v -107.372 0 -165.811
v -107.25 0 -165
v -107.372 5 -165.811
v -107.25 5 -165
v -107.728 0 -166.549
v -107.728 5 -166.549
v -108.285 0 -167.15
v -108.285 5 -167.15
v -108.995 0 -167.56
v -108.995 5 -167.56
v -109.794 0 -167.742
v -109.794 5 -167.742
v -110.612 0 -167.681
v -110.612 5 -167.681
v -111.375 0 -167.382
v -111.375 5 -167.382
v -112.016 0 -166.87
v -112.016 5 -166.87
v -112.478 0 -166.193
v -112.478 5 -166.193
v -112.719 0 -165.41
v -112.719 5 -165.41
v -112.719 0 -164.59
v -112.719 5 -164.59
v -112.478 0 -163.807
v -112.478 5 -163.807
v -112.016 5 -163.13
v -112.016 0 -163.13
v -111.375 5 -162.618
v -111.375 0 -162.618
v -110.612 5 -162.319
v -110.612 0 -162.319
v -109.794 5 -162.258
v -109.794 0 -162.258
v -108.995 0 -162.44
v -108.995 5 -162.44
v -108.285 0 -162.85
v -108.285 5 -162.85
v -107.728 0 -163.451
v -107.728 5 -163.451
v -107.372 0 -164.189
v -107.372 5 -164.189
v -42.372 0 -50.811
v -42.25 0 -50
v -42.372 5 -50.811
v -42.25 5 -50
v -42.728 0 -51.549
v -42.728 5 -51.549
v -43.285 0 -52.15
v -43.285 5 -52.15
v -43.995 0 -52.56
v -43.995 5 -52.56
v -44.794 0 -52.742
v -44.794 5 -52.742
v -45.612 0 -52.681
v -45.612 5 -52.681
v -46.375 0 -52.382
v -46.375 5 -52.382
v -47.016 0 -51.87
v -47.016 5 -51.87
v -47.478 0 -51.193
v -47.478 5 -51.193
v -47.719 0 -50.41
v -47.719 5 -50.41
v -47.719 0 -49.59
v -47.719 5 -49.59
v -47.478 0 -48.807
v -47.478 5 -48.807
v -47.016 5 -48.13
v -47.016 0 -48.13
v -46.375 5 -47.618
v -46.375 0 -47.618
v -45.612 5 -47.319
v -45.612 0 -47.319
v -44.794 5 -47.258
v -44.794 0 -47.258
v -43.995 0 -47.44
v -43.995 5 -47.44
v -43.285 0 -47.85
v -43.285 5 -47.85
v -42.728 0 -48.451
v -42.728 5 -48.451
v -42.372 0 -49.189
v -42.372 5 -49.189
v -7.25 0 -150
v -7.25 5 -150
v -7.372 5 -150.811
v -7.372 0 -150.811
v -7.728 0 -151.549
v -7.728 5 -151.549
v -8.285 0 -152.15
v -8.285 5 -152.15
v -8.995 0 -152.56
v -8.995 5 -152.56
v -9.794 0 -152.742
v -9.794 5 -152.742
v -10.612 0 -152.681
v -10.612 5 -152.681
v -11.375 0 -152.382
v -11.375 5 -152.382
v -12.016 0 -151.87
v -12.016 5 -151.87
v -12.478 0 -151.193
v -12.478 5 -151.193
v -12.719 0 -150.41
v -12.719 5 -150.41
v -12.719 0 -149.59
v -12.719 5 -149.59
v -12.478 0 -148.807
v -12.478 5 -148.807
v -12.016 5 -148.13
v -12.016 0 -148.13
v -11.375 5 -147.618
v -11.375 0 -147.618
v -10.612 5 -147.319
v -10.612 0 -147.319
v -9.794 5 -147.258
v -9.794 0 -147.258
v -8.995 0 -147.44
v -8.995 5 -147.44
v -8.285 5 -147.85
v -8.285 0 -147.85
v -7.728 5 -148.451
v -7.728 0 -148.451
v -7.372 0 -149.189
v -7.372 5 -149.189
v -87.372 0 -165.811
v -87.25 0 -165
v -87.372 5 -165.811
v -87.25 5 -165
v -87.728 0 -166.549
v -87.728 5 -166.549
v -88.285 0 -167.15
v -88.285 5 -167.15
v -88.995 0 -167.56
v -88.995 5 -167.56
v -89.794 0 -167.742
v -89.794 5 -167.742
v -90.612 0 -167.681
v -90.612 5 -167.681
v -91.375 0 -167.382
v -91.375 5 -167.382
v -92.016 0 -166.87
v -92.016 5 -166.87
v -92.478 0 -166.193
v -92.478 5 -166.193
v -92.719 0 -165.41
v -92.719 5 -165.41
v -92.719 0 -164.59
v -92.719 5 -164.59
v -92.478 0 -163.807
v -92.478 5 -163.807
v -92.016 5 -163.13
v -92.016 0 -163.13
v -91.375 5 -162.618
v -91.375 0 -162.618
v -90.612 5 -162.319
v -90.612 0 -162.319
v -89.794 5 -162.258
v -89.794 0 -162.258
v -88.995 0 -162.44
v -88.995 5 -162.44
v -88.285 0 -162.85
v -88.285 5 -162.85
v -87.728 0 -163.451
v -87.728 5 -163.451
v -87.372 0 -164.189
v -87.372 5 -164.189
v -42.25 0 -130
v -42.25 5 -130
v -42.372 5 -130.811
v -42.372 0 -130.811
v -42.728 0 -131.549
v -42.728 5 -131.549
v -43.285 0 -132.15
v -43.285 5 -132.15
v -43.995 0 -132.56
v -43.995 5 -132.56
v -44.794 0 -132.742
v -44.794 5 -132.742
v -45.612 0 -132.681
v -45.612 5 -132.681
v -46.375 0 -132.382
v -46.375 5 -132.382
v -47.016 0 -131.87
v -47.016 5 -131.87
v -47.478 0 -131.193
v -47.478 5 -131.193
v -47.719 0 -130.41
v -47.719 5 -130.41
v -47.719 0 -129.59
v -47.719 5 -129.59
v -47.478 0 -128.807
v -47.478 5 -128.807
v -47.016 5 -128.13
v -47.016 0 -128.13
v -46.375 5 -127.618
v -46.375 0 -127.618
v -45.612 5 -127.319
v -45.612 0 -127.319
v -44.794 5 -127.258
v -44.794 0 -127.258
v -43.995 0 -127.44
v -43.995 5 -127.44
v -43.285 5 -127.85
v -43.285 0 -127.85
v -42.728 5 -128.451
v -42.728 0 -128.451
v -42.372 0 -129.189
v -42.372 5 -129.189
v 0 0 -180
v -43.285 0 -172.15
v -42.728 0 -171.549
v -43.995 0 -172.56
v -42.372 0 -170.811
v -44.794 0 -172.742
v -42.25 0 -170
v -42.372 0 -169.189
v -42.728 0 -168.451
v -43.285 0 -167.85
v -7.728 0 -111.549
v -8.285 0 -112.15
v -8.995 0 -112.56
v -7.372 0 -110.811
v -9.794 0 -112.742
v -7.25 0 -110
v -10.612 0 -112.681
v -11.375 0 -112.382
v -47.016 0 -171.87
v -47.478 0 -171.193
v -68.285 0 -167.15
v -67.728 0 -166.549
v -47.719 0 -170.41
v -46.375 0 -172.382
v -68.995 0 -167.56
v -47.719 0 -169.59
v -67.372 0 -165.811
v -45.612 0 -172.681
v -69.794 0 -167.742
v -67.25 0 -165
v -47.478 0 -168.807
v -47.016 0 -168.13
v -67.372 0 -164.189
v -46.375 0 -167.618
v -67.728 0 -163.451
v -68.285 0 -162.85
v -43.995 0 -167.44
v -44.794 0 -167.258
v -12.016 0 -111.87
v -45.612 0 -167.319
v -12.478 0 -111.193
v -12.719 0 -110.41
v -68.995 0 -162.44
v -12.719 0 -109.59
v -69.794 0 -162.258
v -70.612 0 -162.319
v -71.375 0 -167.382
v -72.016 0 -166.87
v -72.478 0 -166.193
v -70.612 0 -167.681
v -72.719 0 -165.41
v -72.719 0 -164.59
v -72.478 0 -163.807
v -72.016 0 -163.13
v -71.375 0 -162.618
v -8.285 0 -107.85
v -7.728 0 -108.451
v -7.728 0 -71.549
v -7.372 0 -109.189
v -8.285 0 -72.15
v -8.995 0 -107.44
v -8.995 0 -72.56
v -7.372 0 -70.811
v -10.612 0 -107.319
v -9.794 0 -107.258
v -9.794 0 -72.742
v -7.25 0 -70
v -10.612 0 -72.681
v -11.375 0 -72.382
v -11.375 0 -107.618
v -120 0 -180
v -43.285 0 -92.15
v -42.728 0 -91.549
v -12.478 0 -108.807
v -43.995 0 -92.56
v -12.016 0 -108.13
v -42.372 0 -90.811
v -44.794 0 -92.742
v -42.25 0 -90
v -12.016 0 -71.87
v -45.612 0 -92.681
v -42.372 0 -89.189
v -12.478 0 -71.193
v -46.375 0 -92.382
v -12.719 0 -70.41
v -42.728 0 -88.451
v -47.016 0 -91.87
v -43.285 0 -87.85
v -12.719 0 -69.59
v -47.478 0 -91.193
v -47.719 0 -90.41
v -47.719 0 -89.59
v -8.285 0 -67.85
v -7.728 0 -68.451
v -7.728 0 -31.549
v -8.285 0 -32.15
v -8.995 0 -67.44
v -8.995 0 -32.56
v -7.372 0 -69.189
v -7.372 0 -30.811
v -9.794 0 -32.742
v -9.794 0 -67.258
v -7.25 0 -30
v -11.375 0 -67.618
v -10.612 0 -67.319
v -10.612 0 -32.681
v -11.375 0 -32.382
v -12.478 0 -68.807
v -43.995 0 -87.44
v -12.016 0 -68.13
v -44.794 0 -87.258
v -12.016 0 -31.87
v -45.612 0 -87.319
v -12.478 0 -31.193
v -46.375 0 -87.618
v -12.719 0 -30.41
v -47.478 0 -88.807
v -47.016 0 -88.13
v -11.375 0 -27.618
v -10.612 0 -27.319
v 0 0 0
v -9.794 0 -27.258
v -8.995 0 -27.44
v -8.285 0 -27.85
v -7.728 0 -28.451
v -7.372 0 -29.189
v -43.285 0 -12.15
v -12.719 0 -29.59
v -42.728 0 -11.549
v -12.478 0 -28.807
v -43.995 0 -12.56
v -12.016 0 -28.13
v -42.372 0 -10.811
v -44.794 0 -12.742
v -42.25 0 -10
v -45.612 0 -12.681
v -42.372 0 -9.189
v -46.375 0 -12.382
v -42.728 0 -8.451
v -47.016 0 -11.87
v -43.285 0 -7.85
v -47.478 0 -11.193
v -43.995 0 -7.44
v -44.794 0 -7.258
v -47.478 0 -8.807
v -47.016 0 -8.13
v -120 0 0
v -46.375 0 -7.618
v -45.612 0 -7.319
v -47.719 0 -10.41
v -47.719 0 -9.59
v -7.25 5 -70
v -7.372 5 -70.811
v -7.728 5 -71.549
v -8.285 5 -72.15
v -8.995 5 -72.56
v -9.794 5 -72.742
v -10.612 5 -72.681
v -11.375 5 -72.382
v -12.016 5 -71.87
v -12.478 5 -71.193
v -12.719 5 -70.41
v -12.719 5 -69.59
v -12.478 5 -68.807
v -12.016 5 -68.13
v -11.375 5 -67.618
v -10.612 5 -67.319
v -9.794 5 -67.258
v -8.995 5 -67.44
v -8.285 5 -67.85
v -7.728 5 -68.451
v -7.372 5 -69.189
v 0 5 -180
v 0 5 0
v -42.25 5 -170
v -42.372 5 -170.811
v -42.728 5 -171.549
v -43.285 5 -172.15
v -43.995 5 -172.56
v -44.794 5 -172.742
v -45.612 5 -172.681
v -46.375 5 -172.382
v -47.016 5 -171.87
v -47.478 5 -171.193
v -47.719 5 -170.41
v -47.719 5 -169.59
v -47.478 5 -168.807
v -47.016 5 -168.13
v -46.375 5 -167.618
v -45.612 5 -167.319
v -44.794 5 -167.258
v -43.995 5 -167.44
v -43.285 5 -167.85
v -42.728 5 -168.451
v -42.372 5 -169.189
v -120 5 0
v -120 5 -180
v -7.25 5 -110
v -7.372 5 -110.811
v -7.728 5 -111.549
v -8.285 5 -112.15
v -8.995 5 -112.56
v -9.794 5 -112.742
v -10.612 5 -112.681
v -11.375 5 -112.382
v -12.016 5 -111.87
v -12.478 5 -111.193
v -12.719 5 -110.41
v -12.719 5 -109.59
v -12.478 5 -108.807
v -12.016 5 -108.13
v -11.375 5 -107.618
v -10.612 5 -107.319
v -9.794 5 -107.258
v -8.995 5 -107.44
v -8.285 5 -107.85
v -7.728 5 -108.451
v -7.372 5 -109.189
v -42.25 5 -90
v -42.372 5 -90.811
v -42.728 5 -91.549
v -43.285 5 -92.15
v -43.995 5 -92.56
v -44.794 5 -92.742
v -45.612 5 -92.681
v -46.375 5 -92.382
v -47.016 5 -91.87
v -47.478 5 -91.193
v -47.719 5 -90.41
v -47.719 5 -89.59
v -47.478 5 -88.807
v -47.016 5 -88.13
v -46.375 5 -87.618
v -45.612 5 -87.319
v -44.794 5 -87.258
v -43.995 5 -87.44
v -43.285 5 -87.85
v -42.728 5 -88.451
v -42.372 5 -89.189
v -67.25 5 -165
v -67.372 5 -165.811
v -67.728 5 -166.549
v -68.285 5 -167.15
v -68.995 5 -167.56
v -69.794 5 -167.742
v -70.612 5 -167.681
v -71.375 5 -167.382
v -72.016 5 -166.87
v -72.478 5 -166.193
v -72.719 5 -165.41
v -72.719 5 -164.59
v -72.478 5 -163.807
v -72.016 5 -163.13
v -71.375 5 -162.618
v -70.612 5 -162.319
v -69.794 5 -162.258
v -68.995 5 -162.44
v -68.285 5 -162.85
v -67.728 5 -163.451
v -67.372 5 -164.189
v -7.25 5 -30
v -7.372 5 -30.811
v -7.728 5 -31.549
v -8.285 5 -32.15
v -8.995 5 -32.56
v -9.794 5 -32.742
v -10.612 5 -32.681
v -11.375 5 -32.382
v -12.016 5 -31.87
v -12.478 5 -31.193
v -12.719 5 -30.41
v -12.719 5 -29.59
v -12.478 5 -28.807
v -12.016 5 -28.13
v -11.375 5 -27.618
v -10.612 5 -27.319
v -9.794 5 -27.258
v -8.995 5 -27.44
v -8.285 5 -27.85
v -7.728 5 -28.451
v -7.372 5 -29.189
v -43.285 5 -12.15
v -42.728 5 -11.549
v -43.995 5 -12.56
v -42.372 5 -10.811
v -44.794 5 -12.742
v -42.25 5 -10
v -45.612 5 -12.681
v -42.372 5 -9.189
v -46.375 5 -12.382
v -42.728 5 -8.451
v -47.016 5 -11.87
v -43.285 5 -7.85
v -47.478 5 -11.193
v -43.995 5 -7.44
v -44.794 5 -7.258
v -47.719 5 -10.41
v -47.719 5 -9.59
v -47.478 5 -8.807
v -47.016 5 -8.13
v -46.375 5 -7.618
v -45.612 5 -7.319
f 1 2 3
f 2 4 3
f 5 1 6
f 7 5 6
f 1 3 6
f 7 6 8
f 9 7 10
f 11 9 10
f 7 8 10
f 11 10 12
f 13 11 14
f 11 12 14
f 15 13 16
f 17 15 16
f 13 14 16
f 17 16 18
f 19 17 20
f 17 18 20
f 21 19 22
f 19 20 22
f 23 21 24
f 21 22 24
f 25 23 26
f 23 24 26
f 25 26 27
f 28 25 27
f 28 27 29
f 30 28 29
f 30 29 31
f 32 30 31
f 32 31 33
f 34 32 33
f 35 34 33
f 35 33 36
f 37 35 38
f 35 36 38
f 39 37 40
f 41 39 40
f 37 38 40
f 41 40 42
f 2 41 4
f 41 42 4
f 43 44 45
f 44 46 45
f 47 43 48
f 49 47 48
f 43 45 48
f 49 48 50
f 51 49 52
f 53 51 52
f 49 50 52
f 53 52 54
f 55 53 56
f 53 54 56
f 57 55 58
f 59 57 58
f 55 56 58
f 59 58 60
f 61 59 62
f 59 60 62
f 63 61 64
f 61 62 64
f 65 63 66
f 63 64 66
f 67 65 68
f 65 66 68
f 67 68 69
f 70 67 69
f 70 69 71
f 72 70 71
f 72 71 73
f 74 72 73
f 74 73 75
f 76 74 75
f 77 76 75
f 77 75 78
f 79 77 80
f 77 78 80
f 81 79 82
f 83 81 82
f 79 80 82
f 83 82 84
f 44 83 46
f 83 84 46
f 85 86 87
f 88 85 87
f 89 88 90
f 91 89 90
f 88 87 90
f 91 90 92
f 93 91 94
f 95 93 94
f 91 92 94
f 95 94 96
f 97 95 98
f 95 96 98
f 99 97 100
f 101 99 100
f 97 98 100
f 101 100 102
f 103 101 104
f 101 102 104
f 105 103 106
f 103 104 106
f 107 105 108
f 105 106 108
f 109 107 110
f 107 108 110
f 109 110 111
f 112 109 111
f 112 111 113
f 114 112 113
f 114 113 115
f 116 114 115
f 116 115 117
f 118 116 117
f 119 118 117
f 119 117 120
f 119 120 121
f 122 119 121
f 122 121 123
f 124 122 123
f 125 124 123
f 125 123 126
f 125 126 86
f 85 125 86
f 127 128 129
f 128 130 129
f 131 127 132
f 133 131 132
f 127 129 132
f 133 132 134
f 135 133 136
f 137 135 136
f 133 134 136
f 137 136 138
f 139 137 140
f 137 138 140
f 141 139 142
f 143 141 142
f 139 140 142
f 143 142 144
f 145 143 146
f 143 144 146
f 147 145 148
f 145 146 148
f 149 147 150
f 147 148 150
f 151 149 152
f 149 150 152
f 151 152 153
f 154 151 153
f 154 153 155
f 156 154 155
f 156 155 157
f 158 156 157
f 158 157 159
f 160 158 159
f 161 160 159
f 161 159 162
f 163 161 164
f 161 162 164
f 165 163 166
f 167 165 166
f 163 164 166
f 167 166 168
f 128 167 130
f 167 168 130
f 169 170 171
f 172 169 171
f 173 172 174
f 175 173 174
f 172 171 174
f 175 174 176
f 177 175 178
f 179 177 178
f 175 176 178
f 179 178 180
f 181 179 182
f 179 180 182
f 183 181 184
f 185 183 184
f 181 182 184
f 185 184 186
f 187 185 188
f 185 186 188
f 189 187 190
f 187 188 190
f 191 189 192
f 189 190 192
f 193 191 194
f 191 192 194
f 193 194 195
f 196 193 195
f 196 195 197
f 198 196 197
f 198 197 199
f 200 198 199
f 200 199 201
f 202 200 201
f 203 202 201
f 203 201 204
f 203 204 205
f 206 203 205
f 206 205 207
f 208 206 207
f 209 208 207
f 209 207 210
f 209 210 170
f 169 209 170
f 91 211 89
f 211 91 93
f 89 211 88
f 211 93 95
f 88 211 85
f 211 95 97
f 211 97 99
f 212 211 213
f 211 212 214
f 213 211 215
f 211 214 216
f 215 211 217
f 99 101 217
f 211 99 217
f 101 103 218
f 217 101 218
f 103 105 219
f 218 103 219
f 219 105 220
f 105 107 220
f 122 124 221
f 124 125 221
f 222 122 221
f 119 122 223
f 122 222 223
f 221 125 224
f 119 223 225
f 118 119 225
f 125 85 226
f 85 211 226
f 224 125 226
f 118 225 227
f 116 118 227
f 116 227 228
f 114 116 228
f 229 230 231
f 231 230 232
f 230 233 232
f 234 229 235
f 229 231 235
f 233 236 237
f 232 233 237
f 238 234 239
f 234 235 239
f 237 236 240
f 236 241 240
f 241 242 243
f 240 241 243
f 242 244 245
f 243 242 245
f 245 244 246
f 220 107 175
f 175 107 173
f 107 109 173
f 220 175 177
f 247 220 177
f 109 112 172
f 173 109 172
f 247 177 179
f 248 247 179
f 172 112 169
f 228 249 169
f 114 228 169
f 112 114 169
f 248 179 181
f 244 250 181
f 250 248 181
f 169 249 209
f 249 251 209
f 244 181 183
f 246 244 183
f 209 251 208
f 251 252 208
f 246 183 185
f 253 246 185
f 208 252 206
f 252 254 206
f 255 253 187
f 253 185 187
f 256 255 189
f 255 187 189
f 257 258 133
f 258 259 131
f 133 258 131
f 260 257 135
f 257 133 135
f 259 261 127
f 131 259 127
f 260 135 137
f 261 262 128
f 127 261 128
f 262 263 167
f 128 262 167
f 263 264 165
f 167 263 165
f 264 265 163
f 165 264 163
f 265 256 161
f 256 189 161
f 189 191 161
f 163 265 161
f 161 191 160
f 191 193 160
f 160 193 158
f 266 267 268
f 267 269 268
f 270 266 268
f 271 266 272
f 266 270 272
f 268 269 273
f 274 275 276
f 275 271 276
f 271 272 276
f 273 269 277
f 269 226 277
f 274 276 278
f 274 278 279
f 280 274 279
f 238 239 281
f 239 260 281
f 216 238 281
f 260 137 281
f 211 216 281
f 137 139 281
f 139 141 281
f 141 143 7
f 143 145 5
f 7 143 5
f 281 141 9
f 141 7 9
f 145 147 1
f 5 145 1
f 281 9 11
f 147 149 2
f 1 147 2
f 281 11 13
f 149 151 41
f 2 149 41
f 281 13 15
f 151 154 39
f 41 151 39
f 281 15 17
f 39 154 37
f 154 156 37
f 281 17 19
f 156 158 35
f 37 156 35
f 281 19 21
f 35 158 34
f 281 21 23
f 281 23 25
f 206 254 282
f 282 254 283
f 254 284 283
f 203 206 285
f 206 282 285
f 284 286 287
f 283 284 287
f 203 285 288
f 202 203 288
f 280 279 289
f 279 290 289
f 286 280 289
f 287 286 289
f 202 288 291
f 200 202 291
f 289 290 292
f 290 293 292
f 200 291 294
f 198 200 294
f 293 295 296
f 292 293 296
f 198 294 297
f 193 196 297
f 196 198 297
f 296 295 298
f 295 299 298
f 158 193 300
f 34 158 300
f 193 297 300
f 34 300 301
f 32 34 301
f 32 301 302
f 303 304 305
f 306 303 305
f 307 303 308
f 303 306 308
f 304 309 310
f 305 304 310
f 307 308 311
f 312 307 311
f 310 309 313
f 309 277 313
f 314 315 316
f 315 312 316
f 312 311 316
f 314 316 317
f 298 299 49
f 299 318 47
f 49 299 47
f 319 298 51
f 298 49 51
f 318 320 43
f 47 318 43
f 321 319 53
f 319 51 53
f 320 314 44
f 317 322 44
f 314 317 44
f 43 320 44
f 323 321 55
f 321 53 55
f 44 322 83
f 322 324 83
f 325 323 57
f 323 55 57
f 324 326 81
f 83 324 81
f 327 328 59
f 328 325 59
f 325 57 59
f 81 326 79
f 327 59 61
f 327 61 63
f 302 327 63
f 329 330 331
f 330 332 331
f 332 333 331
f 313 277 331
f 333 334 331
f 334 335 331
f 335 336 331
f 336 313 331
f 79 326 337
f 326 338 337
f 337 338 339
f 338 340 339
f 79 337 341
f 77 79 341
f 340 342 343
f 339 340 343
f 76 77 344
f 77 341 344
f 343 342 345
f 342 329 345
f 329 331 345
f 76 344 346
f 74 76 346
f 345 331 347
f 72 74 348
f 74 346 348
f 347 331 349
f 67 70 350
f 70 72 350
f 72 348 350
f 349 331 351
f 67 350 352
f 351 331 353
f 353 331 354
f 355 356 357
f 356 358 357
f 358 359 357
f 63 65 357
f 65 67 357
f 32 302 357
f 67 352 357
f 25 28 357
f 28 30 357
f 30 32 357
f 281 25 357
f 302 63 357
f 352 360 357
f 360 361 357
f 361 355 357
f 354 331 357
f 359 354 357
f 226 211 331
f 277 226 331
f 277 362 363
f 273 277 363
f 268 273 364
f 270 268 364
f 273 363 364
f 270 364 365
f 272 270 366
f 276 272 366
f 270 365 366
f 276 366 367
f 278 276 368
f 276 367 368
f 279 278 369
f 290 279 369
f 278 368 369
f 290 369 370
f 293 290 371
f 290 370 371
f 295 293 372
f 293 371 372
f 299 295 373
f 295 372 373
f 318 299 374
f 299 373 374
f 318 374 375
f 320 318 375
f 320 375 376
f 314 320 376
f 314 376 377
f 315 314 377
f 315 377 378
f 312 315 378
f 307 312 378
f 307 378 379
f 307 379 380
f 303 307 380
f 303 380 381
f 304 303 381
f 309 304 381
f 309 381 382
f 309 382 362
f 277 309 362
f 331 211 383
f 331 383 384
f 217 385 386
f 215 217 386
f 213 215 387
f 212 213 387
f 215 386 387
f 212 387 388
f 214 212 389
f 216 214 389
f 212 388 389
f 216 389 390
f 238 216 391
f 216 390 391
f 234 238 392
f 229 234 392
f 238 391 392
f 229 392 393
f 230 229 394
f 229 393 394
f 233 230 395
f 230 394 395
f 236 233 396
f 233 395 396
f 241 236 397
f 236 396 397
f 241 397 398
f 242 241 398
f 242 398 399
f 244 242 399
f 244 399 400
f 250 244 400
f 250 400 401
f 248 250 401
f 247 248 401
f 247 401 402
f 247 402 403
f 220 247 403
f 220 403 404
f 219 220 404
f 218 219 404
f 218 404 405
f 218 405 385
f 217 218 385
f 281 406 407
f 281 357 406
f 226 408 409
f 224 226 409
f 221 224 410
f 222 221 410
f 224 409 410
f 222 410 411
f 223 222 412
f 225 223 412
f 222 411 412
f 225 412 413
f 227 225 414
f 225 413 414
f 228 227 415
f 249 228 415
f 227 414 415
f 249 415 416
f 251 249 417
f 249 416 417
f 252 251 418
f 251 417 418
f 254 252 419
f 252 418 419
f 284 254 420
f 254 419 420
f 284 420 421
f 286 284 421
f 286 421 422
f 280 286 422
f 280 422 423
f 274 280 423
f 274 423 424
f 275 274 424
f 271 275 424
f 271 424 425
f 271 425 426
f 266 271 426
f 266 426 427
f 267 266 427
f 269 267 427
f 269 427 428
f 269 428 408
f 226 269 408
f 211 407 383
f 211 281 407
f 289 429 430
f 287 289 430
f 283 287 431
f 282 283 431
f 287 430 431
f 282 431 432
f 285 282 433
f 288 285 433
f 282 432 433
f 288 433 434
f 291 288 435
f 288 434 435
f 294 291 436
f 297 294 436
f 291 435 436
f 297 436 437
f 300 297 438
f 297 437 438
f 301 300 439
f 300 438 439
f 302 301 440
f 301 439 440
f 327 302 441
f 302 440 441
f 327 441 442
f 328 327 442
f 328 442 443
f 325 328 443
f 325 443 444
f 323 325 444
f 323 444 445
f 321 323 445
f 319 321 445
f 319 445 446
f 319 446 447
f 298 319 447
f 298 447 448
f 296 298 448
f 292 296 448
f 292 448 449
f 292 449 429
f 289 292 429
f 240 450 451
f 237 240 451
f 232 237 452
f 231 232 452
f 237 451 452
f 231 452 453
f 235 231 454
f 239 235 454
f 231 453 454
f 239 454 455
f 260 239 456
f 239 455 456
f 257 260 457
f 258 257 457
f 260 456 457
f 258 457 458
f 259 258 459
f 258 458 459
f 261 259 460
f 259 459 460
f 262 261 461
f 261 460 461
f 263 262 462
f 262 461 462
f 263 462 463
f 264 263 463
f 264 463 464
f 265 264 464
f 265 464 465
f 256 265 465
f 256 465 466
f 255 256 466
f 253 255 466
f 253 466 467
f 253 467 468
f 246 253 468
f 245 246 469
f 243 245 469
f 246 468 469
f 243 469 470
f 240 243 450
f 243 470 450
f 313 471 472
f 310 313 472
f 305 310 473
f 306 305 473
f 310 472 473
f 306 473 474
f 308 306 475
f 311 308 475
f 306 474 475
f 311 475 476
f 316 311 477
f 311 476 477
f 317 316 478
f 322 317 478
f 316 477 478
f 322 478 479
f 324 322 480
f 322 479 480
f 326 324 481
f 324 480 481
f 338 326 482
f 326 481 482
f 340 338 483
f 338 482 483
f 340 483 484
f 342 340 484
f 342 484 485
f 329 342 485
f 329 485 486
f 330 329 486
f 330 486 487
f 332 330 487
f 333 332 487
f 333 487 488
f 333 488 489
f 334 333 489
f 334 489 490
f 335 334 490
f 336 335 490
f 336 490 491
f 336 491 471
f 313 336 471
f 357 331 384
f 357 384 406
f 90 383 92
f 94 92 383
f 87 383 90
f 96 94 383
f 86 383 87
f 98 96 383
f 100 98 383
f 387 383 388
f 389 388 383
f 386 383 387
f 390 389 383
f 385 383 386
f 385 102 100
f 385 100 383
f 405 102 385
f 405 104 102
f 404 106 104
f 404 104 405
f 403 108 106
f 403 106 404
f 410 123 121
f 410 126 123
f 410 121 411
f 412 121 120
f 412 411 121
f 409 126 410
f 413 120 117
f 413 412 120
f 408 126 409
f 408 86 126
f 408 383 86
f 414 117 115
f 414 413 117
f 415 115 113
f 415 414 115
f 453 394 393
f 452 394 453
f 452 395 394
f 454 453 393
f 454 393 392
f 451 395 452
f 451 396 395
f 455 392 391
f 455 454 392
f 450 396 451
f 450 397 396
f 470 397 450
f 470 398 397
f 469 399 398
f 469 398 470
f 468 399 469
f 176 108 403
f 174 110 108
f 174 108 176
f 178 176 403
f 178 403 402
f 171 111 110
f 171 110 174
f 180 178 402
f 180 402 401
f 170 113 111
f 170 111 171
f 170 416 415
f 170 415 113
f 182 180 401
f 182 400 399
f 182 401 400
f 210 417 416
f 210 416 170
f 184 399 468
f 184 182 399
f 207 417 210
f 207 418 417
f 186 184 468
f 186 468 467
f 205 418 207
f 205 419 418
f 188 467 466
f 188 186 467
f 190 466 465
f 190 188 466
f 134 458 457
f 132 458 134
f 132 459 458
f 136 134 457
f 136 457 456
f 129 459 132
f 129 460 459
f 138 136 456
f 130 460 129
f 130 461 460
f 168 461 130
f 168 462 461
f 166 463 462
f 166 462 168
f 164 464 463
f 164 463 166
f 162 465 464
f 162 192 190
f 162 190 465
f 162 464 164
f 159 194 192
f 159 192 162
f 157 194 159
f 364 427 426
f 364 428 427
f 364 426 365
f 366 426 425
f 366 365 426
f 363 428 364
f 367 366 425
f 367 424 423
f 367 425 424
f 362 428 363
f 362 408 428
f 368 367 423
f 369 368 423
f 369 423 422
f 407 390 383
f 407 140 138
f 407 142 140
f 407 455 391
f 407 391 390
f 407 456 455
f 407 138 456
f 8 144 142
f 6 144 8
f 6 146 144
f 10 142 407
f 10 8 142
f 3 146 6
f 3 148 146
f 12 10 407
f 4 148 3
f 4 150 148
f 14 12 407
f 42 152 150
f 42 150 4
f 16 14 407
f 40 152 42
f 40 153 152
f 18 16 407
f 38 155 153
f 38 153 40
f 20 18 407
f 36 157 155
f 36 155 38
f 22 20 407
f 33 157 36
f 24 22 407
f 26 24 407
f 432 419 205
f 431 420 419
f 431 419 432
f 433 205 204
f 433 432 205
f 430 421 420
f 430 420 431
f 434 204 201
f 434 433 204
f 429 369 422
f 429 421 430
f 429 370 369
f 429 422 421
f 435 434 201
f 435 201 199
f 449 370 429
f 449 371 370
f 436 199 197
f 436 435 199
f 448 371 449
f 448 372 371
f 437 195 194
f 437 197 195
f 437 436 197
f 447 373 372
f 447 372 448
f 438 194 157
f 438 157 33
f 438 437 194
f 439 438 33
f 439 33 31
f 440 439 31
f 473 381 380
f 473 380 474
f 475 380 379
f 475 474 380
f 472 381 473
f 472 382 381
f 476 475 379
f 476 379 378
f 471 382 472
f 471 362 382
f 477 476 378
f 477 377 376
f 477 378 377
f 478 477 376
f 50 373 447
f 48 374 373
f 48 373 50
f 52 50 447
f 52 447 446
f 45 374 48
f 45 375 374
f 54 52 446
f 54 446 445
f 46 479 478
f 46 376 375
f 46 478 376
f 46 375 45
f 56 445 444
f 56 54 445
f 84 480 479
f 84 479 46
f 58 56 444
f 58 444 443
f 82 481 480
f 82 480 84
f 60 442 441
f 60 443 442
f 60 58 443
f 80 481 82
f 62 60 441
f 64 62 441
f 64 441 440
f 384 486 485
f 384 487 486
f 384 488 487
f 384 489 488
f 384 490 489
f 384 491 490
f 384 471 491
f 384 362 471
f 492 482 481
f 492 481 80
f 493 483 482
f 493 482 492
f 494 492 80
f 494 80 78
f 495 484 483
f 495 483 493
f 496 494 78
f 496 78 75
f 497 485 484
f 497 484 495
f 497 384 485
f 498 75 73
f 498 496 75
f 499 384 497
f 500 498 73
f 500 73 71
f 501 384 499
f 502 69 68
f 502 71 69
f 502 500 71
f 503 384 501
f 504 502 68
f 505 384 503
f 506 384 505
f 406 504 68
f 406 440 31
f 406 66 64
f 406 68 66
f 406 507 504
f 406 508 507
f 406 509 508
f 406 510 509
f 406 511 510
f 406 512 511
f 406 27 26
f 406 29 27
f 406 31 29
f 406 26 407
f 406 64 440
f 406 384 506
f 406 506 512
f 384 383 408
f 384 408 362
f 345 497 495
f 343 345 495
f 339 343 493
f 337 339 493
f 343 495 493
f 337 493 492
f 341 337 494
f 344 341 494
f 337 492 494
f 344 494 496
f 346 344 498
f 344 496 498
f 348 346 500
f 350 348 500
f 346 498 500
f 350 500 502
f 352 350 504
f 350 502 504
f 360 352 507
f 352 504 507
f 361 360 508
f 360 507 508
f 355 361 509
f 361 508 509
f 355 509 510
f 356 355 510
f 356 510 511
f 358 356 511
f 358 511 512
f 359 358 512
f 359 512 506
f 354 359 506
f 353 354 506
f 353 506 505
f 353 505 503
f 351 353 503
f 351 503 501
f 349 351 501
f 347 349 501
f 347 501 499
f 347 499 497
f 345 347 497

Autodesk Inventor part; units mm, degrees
ref_plane "YZ Plane" through (0, 0, 0) normal (1, 0, 0) x (0, 1, 0)
ref_plane "XZ Plane" through (0, 0, 0) normal (0, 1, 0) x (-1, 0, 0)
ref_plane "XY Plane" through (0, 0, 0) normal (0, 0, 1) x (1, 0, 0)
sketch "Sketch1" plane through (0, 0, 0) normal (0, 1, 0) x (-1, 0, 0)
  line L0 (0, 0) -> (120, 0)
  line L1 (120, 0) -> (120, -180)
  line L2 (120, -180) -> (0, -180)
  line L3 (0, -180) -> (0, 0)
  dimension "d0" = 120
  dimension "d1" = 180
extrude "Extrusion1" add sketch "Sketch1" along normal blind 5
sketch "Sketch2" plane through (0, 5, 0) normal (0, 1, 0) x (1, 0, 0)
  circle A0 centre (-45, 10) radius 2.75
  line L0 (-120, 0) -> (0, 0) projected
  line L1 (0, 0) -> (0, 180) projected
  circle A1 centre (-45, 50) radius 2.75
  circle A2 centre (-45, 90) radius 2.75
  circle A3 centre (-45, 130) radius 2.75
  circle A4 centre (-45, 170) radius 2.75
  circle A5 centre (-10, 30) radius 2.75
  circle A6 centre (-10, 70) radius 2.75
  circle A7 centre (-10, 110) radius 2.75
  circle A8 centre (-10, 150) radius 2.75
  dimension "d4" = 5.5
  dimension "d5" = 10
  dimension "d8" = 40
  dimension "d13" = 45
  dimension "d14" = 5.5
  dimension "d15" = 10
  dimension "d16" = 180
  dimension "d17" = 30
  dimension "d20" = 40
extrude "Extrusion2" cut sketch "Sketch2" against normal blind 5
sketch "Sketch3" plane through (0, 5, 0) normal (0, 1, 0) x (1, 0, 0)
  circle A0 centre (-110, 165) radius 2.75
  line L0 (0, 180) -> (-120, 180) projected
  circle A1 centre (-90, 165) radius 2.75
  circle A2 centre (-70, 165) radius 2.75
  line L1 (-120, 180) -> (-120, 0) projected
  point P0 (0, 0)
  dimension "d27" = 5.5
  dimension "d28" = 15
  dimension "d31" = 20
  dimension "d38" = 10
extrude "Extrusion3" cut sketch "Sketch3" against normal blind 5
properties part number "GanrtyPlatev2"
